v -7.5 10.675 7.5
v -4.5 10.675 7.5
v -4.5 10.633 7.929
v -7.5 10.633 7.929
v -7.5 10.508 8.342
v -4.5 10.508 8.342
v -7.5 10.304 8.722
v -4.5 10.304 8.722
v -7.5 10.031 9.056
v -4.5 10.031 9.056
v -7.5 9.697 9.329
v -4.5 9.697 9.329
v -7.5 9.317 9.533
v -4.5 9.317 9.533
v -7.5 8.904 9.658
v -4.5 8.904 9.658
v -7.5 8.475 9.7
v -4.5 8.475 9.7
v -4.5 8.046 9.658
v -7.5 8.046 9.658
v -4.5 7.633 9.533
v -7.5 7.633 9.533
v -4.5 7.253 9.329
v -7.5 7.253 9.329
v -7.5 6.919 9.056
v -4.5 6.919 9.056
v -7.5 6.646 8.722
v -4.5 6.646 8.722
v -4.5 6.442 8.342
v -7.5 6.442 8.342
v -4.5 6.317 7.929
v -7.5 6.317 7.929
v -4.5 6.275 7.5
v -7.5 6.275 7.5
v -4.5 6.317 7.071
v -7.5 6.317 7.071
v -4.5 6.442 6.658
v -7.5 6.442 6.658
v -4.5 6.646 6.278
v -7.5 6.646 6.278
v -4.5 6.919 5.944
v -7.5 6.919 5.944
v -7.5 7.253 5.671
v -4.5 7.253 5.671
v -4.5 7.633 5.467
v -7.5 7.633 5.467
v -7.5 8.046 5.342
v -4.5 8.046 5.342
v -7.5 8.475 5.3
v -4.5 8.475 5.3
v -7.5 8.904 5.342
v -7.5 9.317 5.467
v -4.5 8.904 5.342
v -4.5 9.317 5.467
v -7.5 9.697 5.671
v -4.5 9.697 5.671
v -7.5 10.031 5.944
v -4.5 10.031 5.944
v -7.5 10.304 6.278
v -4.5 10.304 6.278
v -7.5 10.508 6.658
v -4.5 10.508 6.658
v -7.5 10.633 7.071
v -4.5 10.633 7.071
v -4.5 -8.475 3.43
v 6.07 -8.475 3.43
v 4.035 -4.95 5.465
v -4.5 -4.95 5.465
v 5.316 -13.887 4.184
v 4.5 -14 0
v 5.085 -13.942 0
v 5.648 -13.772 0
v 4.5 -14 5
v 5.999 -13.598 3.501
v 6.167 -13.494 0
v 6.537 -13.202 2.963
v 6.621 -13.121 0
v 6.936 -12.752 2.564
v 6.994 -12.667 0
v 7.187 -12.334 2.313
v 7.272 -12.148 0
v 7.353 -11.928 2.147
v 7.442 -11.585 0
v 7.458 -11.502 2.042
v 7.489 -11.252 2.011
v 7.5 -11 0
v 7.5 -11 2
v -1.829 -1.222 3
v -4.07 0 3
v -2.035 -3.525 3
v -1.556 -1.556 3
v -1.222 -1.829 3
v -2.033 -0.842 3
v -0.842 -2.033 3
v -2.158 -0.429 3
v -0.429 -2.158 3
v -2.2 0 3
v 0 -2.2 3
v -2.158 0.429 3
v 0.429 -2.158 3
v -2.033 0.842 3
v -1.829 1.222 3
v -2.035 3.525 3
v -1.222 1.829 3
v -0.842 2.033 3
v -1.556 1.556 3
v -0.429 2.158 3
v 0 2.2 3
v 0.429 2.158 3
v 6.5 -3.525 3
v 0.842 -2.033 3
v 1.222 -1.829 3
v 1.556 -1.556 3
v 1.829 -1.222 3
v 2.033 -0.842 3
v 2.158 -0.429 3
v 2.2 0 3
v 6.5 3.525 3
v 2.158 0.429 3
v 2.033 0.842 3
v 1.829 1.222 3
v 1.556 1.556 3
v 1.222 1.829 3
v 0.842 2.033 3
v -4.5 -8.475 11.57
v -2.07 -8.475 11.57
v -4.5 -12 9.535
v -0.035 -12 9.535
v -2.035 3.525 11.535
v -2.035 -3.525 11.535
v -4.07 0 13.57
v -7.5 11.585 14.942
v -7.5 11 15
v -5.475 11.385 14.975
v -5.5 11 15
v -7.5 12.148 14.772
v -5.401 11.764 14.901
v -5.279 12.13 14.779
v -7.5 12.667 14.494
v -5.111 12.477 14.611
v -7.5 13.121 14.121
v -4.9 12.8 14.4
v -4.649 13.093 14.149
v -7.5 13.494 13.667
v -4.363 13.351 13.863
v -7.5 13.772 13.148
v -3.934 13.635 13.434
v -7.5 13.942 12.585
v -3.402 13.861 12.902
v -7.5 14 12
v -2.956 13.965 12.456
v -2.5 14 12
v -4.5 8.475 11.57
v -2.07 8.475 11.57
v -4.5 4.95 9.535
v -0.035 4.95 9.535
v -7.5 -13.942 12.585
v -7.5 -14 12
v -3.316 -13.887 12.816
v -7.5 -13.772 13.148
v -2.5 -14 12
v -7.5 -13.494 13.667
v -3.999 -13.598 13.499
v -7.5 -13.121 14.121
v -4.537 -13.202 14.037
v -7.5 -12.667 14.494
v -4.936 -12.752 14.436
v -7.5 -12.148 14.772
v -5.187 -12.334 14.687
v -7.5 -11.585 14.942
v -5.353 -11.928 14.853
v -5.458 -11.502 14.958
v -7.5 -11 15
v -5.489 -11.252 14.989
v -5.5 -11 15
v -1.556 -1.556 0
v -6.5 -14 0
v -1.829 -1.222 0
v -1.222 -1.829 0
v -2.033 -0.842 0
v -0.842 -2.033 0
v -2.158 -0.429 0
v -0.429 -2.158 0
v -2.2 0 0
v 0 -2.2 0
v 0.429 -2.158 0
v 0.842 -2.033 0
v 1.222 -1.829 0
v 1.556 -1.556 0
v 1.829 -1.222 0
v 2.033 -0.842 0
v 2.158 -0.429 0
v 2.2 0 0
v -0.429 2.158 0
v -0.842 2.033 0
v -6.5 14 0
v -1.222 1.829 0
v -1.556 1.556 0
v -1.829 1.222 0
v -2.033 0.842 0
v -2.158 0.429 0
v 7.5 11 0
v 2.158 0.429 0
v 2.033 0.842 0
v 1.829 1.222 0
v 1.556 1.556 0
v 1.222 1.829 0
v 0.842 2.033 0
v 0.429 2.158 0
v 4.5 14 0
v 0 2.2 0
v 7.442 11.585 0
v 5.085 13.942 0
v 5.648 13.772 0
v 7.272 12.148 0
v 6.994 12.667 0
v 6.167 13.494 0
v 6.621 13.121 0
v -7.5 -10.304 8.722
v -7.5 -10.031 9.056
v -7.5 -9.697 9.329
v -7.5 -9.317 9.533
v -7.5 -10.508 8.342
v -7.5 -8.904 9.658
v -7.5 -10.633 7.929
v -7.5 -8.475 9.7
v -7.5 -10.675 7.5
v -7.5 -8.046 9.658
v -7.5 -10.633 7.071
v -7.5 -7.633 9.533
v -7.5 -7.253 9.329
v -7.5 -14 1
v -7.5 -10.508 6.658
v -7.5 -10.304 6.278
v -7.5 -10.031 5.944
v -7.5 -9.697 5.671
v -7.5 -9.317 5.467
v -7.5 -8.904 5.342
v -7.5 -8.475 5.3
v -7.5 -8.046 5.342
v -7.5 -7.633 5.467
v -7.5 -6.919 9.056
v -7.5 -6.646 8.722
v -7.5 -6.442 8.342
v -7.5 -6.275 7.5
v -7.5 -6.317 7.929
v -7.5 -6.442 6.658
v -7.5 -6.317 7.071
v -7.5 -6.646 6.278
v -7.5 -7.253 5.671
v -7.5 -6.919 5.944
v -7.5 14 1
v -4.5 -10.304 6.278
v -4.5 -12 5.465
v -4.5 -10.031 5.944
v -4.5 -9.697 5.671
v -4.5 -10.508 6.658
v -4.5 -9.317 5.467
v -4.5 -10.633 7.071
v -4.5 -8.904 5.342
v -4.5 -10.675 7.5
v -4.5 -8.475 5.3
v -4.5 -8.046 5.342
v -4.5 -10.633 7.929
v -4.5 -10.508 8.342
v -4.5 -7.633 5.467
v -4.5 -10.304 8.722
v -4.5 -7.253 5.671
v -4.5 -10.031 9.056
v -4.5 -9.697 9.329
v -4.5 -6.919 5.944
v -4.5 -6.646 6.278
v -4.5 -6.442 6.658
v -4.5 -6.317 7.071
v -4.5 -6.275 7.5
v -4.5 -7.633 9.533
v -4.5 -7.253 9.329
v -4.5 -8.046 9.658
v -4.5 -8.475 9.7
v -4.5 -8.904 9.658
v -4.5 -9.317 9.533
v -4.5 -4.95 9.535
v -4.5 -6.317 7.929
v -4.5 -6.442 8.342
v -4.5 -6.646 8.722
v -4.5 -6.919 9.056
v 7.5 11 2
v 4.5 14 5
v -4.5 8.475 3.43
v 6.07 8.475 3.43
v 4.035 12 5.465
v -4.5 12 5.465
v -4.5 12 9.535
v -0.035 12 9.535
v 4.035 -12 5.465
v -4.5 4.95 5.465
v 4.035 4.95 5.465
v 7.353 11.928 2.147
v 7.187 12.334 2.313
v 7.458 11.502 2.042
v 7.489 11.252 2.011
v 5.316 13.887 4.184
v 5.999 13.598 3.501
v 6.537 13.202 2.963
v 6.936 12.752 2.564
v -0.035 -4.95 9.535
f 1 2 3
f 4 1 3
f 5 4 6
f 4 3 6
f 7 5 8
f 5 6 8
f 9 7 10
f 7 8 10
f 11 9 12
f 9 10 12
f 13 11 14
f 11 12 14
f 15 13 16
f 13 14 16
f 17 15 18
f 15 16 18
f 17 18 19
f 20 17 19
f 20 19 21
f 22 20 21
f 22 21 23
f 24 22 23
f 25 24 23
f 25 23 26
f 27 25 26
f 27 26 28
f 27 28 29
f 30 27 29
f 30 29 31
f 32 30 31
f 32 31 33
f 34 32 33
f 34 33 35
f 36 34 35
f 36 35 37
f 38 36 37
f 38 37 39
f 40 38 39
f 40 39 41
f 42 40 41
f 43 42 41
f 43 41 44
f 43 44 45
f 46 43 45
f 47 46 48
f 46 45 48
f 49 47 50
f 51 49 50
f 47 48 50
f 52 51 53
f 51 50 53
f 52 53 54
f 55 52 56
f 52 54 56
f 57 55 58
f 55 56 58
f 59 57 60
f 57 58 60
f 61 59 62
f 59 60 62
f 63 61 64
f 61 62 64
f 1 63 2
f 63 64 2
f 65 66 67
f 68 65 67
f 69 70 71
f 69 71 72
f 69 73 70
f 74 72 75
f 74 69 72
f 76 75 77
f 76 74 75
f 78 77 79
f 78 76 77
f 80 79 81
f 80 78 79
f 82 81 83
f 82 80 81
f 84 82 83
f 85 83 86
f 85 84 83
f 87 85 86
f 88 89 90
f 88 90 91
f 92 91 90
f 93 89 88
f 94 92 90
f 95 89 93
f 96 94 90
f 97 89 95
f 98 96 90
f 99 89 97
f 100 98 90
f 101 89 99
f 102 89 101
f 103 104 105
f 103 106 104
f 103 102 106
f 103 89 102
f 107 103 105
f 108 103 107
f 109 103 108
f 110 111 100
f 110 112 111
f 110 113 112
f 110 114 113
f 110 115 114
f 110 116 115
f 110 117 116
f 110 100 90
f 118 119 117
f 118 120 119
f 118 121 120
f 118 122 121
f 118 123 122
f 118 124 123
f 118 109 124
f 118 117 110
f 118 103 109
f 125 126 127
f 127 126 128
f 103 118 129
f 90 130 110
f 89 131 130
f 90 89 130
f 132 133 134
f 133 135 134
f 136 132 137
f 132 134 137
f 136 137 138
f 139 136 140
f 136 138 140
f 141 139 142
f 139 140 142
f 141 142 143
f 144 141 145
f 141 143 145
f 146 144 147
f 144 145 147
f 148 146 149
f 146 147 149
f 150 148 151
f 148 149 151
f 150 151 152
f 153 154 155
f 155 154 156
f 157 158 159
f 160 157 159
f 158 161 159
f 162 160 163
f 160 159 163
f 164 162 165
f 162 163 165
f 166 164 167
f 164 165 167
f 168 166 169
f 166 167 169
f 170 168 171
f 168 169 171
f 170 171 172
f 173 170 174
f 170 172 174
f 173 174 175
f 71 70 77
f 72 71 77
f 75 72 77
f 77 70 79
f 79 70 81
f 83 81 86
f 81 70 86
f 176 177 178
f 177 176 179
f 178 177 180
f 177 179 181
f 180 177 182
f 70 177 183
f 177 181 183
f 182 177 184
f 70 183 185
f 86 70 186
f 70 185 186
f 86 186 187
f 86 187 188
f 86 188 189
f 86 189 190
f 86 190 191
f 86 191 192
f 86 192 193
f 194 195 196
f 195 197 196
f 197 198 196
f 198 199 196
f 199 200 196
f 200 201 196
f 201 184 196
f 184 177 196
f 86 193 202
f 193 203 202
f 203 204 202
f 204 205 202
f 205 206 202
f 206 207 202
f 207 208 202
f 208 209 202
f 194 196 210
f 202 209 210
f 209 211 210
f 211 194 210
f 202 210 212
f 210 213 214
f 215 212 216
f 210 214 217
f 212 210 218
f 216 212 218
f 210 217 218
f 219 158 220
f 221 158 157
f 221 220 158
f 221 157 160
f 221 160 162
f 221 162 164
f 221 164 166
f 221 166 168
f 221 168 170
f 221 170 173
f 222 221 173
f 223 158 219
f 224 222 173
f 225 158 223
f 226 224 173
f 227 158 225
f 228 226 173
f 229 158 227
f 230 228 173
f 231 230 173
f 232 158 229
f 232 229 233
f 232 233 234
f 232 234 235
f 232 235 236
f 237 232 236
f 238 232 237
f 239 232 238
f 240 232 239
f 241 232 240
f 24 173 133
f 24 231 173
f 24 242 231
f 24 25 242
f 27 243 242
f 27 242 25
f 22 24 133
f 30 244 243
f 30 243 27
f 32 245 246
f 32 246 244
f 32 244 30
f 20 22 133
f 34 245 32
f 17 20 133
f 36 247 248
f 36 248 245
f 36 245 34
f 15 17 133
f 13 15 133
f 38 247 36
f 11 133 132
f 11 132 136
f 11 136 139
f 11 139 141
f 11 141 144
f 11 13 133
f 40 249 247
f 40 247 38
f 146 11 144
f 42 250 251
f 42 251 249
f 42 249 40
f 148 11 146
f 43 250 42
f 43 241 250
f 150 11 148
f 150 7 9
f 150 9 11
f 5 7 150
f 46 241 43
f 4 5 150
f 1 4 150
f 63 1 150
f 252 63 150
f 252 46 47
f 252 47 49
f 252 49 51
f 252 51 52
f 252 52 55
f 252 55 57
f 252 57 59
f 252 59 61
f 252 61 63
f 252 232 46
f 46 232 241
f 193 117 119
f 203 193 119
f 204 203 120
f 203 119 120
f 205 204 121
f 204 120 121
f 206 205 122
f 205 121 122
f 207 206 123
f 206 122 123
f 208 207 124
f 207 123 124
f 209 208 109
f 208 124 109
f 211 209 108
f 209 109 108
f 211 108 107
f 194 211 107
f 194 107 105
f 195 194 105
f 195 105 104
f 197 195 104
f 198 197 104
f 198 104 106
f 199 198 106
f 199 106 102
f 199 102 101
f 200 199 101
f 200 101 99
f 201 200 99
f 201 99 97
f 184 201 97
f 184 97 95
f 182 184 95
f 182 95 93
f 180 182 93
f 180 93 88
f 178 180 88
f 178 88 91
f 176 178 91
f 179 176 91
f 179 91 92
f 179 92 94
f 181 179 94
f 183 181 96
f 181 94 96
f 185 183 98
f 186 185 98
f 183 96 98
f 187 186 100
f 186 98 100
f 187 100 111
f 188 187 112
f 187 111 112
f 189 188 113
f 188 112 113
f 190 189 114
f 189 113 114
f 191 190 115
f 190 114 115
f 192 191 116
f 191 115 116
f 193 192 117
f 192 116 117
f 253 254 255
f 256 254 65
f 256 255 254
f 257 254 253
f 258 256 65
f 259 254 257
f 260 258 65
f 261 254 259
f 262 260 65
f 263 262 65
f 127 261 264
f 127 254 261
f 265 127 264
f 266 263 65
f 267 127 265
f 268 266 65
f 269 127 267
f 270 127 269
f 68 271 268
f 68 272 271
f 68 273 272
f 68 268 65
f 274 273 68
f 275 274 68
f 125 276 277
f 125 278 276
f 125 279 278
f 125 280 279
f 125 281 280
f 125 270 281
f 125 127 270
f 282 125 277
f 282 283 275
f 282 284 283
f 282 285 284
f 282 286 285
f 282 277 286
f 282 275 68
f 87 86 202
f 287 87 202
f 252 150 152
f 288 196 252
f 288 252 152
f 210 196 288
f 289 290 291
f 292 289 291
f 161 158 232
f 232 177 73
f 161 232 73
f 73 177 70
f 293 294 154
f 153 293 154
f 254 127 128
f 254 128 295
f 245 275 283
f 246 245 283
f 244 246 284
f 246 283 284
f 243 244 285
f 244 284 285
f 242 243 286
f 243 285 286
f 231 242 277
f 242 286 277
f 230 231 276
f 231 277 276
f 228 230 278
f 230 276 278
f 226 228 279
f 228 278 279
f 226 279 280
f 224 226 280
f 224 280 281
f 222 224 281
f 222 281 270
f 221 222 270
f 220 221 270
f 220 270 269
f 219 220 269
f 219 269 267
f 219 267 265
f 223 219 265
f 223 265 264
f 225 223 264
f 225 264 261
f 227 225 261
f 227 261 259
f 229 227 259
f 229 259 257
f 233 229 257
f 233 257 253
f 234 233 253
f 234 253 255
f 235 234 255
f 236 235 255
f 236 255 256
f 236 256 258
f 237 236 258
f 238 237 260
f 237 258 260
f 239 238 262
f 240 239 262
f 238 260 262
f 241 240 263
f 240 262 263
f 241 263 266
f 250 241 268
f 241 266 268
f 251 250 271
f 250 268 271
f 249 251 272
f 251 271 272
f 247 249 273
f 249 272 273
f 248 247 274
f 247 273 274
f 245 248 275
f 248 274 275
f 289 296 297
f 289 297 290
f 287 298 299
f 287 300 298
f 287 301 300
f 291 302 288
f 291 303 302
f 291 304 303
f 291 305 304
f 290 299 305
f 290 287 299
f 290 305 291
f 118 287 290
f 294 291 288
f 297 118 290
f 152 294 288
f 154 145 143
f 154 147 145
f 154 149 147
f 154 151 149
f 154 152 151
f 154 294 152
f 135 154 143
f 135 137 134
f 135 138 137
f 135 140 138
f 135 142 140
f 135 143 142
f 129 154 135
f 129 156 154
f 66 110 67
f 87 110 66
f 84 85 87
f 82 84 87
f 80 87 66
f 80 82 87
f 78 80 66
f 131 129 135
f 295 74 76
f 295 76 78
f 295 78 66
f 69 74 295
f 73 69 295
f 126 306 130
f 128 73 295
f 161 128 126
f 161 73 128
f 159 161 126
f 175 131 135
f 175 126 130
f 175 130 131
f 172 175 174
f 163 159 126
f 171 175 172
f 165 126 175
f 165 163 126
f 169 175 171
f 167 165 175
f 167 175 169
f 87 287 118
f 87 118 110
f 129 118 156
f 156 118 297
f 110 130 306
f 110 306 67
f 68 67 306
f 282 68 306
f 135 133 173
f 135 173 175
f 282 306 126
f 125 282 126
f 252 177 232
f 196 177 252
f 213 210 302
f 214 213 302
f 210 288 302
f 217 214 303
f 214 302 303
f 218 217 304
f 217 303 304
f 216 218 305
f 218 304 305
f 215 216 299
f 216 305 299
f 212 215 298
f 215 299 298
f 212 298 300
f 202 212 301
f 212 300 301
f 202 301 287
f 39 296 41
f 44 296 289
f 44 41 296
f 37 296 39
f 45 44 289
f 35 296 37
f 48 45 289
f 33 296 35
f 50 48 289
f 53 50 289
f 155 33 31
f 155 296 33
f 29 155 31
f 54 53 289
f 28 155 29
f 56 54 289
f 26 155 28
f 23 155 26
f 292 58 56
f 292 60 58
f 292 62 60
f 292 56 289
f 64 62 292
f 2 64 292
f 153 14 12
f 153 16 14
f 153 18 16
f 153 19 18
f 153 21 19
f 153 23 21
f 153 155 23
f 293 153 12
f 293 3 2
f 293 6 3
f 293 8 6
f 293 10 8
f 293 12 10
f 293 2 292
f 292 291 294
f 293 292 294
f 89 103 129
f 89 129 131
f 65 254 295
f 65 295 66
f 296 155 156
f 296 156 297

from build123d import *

# Parameters (mm, degrees)
SKETCH_W        = 15
SKETCH_H        = 28
PAD_DEPTH       = 15
SKETCH001_R     = 2.2
POCKET_DEPTH    = 15.001
POCKET001_DEPTH = 12
SKETCH003_R     = 2.2
POCKET002_DEPTH = 15.001
POCKET003_DEPTH = 12
POCKET004_DEPTH = 28.001
FILLET_R        = 3
CHAMFER_SIZE    = 1


with BuildPart() as part:
    # Sketch → Pad (new body)
    with BuildSketch(Plane.XY):
        Rectangle(SKETCH_W, SKETCH_H)
    extrude(amount=PAD_DEPTH)

    # Sketch001 → Pocket (cut, through all)
    with BuildSketch(Plane.YZ.offset(7.5)):
        with Locations((-8.475, 7.5)):
            Circle(SKETCH001_R)
        with Locations((8.475, 7.5)):
            Circle(SKETCH001_R)
    extrude(amount=-POCKET_DEPTH, mode=Mode.SUBTRACT)

    # Sketch002 → Pocket001 (cut)
    with BuildSketch(Plane.YZ.offset(7.5)):
        Polygon((-8.475, 3.429681), (-4.95, 5.46484), (-4.95, 9.53516), (-8.475, 11.570319), (-12, 9.53516), (-12, 5.46484), align=None)
        Polygon((8.475, 3.429681), (12, 5.46484), (12, 9.53516), (8.475, 11.570319), (4.95, 9.53516), (4.95, 5.46484), align=None)
    extrude(amount=-POCKET001_DEPTH, mode=Mode.SUBTRACT)

    # Sketch003 → Pocket002 (cut, through all)
    with BuildSketch(Plane.XY.offset(15)):
        Circle(SKETCH003_R)
    extrude(amount=-POCKET002_DEPTH, mode=Mode.SUBTRACT)

    # Sketch004 → Pocket003 (cut)
    with BuildSketch(Plane.XY.offset(15)):
        Polygon((2.03516, 3.525), (-2.03516, 3.525), (-4.070319, 0), (-2.03516, -3.525), (2.03516, -3.525), (7.53516, -3.525), (7.53516, 3.525), align=None)
    extrude(amount=-POCKET003_DEPTH, mode=Mode.SUBTRACT)

    # Sketch005 → Pocket004 (cut, through all)
    with BuildSketch(Plane.XZ.offset(14)):
        Polygon((7.5, 15), (7.5, 2), (-5.5, 15), align=None)
    extrude(amount=-POCKET004_DEPTH, mode=Mode.SUBTRACT)

    # Fillet
    fillet_edges = [part.edges().sort_by_distance(p)[0] for p in [
        (7.5, 14, 1),
        (7.5, -14, 1),
        (-6.5, -14, 15),
        (-6.5, 14, 15),
    ]]
    fillet(fillet_edges, radius=FILLET_R)

    # Chamfer
    chamfer_edges = [part.edges().sort_by_distance(p)[0] for p in [
        (-7.5, 0, 0),
    ]]
    chamfer(chamfer_edges, length=CHAMFER_SIZE)


solid = part.part
